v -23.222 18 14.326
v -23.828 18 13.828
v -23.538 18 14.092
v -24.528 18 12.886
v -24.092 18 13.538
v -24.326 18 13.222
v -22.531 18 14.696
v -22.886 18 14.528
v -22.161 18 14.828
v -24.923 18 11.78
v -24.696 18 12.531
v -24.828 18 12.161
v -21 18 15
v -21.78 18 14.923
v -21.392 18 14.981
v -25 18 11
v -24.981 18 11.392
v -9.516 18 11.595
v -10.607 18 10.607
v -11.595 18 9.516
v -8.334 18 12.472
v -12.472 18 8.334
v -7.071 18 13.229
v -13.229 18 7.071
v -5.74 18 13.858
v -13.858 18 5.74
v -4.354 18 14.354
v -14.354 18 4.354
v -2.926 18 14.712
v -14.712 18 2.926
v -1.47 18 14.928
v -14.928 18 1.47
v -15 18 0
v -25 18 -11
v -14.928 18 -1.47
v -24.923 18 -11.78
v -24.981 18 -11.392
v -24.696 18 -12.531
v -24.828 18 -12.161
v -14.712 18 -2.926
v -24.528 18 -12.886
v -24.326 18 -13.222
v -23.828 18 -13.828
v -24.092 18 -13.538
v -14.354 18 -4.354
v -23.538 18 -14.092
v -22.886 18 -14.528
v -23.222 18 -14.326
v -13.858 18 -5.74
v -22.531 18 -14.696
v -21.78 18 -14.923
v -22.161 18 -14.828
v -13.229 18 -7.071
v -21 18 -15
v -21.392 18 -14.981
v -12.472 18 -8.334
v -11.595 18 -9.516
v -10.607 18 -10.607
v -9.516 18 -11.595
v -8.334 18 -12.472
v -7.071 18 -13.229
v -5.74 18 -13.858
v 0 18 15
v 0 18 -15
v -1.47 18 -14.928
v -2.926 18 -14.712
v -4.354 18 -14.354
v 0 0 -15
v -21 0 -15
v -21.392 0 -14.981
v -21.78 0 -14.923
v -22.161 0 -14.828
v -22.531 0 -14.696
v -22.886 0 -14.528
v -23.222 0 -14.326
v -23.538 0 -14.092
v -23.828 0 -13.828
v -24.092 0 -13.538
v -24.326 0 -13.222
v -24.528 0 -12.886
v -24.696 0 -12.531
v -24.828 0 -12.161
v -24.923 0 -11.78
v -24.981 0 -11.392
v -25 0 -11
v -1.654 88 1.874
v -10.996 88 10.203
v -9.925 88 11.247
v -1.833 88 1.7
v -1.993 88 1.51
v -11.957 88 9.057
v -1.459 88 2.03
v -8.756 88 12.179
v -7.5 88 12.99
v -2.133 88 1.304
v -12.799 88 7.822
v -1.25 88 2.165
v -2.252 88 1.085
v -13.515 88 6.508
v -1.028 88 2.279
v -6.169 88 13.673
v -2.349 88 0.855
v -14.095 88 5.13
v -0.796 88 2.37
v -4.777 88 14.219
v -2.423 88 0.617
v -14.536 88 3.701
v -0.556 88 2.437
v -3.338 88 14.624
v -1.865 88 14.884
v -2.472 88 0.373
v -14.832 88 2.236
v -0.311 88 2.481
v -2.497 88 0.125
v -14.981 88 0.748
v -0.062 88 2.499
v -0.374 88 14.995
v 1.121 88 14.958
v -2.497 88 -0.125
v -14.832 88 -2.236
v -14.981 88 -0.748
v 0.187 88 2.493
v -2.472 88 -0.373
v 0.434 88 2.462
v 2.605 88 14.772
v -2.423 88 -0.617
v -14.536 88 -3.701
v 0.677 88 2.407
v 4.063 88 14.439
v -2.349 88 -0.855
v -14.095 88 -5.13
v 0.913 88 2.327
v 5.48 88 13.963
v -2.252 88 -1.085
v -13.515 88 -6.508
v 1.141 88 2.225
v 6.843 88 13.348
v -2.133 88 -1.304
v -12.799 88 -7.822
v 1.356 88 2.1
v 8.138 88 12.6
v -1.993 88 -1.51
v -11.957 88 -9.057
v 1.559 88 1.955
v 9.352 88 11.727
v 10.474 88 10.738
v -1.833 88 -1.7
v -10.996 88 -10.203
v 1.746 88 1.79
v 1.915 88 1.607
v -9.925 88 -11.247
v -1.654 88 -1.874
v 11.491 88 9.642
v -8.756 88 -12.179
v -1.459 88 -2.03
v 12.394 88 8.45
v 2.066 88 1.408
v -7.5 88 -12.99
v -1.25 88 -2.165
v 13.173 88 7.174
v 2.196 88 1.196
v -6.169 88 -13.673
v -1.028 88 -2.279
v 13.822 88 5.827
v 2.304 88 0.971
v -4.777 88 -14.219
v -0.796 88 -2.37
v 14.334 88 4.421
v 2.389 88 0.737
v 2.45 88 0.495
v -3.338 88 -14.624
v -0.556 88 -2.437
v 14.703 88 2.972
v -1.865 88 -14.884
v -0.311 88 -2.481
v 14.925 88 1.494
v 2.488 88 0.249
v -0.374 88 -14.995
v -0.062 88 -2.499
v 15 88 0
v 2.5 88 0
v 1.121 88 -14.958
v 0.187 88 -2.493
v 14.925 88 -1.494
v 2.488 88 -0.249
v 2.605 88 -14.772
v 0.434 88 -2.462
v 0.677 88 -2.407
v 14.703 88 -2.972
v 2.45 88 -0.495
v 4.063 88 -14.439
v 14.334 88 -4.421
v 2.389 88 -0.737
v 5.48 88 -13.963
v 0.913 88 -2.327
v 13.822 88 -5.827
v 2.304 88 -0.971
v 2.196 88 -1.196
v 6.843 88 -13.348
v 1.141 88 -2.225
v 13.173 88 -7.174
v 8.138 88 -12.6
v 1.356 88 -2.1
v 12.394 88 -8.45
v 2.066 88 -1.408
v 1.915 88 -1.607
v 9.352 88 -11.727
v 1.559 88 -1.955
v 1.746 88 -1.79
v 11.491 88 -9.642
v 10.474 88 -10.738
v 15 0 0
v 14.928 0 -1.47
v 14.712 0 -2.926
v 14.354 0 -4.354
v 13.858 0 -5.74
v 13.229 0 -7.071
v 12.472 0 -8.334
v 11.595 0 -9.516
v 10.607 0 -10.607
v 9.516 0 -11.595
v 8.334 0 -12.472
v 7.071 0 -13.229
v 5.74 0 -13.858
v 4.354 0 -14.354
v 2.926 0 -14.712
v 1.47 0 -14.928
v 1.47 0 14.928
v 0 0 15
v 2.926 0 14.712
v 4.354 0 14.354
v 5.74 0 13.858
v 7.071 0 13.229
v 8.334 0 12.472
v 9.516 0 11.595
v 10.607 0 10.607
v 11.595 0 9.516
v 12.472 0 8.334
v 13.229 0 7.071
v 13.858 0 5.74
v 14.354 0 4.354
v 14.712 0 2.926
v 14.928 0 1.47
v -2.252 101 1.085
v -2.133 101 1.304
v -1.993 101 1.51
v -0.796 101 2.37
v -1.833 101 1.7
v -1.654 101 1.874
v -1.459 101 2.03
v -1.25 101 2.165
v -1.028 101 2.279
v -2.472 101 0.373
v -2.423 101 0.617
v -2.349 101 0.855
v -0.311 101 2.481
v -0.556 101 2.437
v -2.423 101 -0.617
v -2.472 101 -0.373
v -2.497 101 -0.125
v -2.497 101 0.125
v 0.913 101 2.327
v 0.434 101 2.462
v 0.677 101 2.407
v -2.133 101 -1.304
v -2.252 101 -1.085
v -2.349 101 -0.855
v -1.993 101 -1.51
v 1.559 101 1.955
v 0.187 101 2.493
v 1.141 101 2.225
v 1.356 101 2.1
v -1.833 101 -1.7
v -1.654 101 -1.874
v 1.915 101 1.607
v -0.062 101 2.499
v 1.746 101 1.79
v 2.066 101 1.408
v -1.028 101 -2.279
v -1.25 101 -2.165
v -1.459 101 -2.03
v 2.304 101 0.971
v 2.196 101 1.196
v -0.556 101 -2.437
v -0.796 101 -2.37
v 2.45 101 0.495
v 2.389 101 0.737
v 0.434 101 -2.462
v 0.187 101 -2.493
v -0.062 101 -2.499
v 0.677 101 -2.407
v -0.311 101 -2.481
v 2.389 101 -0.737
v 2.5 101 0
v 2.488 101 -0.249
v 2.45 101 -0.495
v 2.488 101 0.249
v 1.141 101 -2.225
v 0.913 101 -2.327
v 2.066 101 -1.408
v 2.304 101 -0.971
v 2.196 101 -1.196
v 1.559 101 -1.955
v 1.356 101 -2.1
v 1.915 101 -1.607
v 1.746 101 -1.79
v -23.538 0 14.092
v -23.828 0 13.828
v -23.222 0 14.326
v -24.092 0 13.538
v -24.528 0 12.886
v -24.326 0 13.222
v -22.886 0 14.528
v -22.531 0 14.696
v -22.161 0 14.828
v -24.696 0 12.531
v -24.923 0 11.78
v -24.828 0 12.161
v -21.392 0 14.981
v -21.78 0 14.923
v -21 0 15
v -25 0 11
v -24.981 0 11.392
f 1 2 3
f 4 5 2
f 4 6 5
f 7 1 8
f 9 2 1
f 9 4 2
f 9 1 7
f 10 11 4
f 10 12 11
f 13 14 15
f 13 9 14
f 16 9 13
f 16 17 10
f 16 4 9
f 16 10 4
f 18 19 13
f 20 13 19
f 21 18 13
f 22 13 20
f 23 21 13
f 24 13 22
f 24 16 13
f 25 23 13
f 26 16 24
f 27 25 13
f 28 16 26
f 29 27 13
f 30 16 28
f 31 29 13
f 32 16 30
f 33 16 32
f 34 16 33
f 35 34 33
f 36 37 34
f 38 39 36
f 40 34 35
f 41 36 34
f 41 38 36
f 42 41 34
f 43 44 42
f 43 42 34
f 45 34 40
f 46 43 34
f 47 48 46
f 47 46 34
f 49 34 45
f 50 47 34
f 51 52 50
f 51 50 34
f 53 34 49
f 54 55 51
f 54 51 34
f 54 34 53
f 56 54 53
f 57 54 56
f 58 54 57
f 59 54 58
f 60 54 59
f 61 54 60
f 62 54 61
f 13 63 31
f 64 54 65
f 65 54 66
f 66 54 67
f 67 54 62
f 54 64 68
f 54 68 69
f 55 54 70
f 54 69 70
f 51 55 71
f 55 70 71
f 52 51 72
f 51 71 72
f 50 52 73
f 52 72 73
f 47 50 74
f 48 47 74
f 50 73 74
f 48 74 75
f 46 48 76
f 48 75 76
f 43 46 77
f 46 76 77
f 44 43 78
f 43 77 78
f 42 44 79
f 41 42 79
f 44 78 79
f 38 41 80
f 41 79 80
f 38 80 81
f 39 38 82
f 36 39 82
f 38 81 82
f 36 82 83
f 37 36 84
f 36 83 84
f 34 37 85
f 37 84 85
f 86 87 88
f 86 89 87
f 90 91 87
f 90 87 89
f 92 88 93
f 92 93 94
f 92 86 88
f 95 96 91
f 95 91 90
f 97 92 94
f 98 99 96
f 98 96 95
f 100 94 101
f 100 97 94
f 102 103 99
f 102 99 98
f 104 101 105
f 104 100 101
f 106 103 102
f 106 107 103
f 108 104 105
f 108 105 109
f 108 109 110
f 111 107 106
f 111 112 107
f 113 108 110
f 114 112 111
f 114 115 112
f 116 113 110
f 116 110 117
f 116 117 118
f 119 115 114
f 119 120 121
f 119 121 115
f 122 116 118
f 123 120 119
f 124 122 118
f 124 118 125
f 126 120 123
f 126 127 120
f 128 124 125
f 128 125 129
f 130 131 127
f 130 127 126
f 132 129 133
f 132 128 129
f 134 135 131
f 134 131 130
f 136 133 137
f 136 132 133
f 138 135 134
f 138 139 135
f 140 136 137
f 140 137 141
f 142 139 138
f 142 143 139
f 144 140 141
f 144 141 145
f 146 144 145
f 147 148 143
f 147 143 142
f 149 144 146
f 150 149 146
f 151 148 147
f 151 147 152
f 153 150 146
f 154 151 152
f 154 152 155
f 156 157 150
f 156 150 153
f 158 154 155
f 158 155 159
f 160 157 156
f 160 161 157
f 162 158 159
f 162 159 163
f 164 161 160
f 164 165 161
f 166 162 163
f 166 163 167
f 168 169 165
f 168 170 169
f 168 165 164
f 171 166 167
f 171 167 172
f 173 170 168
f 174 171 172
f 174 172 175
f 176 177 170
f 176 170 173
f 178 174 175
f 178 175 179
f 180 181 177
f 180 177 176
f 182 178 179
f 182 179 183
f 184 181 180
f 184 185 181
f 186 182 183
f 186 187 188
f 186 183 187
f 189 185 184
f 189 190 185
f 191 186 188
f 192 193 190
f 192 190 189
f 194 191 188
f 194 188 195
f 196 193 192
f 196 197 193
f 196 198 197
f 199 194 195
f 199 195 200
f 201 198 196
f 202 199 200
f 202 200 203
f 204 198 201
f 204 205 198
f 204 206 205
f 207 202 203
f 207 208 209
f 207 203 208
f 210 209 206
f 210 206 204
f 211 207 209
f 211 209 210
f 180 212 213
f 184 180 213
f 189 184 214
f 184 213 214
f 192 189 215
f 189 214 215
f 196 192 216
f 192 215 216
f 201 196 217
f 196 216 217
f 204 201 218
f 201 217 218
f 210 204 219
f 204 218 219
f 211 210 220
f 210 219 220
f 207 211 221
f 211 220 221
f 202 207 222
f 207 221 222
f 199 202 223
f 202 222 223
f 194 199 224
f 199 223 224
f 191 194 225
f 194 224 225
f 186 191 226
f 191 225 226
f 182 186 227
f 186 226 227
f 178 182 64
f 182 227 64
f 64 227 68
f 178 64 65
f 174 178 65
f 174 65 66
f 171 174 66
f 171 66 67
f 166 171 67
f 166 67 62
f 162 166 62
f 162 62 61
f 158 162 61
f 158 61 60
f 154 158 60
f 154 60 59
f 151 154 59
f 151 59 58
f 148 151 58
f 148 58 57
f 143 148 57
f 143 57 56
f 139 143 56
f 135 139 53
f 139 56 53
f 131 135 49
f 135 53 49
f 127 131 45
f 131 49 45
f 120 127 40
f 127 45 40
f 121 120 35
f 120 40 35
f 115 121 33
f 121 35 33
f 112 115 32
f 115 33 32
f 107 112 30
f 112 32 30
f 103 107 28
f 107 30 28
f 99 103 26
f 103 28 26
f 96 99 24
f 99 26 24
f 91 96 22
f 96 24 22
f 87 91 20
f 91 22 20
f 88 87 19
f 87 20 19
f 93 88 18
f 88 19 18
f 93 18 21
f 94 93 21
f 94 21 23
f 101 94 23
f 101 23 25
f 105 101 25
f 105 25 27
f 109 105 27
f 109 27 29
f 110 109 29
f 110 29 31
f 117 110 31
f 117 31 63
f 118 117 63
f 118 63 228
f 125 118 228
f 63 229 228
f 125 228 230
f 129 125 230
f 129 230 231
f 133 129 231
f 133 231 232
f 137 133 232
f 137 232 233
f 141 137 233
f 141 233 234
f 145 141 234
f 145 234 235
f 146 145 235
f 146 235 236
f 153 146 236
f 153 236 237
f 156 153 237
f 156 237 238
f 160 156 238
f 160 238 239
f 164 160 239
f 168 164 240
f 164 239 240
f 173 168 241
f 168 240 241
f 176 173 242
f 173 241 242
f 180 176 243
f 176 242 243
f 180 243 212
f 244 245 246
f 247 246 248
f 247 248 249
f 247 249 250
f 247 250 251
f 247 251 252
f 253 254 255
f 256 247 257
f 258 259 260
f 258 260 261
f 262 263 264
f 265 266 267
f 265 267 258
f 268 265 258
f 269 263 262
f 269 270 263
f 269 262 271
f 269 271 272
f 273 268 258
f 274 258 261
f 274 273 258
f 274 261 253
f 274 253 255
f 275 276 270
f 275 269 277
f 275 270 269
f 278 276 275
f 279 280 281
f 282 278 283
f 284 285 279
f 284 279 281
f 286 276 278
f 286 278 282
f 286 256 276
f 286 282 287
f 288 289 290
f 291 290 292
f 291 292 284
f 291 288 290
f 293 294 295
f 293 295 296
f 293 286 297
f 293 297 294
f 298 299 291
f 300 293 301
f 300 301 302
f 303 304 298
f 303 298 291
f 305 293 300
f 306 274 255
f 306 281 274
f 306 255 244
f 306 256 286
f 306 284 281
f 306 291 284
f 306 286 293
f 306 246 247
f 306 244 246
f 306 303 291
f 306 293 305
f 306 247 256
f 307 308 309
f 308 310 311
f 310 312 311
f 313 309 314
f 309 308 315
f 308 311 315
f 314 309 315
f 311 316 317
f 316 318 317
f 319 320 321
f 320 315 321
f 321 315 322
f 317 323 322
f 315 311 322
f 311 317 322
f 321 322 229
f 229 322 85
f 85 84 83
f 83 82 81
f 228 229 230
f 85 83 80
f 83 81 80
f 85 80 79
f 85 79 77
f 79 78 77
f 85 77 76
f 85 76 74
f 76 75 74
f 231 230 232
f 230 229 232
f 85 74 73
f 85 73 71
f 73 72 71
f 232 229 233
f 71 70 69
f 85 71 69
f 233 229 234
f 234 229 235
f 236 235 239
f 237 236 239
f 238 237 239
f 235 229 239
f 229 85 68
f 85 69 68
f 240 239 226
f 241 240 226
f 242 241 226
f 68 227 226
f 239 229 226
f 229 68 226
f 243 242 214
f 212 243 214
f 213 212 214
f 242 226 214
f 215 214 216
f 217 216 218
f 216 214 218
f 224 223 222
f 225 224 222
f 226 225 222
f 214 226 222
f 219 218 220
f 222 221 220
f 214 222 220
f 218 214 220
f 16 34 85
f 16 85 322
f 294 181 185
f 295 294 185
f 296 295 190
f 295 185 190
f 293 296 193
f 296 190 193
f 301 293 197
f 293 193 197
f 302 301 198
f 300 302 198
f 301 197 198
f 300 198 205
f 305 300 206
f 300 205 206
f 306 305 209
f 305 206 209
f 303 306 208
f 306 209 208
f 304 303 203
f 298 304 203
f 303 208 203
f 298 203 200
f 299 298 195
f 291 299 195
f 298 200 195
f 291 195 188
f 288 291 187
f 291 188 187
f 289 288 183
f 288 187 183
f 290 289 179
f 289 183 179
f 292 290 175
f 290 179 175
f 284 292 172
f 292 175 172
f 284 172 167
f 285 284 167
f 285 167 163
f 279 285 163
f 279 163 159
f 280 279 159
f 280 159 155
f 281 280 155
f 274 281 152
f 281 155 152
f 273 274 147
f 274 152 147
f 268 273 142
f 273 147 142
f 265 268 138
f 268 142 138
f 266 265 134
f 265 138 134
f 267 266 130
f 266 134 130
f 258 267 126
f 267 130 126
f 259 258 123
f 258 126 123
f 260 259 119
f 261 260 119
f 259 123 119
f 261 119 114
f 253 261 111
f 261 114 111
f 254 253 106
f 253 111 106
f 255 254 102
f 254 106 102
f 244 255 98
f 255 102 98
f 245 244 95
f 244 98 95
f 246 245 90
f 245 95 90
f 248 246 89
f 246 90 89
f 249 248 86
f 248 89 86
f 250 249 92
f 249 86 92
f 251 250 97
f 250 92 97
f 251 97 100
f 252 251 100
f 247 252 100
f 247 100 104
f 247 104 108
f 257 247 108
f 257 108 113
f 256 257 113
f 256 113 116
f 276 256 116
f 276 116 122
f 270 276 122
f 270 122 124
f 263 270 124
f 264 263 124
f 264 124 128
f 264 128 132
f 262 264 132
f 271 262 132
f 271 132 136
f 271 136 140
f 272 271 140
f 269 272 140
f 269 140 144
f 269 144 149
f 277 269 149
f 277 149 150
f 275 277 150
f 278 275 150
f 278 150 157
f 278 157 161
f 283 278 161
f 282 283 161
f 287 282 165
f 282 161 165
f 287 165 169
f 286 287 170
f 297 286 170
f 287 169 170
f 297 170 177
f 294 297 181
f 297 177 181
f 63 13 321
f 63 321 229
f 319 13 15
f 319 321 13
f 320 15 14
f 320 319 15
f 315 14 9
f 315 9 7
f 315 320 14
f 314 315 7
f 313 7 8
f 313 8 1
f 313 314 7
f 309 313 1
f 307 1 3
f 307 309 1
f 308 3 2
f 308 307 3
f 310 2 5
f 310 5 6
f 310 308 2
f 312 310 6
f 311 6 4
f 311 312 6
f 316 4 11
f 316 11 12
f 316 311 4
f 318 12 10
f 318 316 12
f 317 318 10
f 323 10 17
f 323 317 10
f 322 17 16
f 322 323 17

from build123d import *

# Parameters (mm, degrees)
SKETCH1_R           = 15
BOSS_EXTRUDE1_DEPTH = 88
SKETCH2_R           = 2.5
BOSS_EXTRUDE2_DEPTH = 13
BOSS_EXTRUDE3_DEPTH = 18
FILLET1_R           = 4


with BuildPart() as part:
    # Sketch1 → Boss-Extrude1 (new body)
    with BuildSketch(Plane(origin=(0, 0, 0), x_dir=(1, 0, 0), z_dir=(0, 1, 0))):
        Circle(SKETCH1_R)
    extrude(amount=BOSS_EXTRUDE1_DEPTH)

    # Sketch2 → Boss-Extrude2 (add)
    with BuildSketch(Plane(origin=(0, 88, 0), x_dir=(1, 0, 0), z_dir=(0, 1, 0))):
        Circle(SKETCH2_R)
    extrude(amount=BOSS_EXTRUDE2_DEPTH)

    # Sketch3 → Boss-Extrude3 (add)
    with BuildSketch(Plane(origin=(0, 18, 0), x_dir=(-1, 0, 0), z_dir=(0, -1, 0))):
        with BuildLine():
            Line((0, 15), (25, 15))
            Line((25, 15), (25, -15))
            Line((25, -15), (0, -15))
            ThreePointArc((0, -15), (-15, 0), (0, 15))
        make_face()
    extrude(amount=BOSS_EXTRUDE3_DEPTH)

    # Fillet1
    fillet1_edges = [part.edges().sort_by_distance(p)[0] for p in [
        (-25, 9, -15),
        (-25, 9, 15),
    ]]
    fillet(fillet1_edges, radius=FILLET1_R)


solid = part.part
